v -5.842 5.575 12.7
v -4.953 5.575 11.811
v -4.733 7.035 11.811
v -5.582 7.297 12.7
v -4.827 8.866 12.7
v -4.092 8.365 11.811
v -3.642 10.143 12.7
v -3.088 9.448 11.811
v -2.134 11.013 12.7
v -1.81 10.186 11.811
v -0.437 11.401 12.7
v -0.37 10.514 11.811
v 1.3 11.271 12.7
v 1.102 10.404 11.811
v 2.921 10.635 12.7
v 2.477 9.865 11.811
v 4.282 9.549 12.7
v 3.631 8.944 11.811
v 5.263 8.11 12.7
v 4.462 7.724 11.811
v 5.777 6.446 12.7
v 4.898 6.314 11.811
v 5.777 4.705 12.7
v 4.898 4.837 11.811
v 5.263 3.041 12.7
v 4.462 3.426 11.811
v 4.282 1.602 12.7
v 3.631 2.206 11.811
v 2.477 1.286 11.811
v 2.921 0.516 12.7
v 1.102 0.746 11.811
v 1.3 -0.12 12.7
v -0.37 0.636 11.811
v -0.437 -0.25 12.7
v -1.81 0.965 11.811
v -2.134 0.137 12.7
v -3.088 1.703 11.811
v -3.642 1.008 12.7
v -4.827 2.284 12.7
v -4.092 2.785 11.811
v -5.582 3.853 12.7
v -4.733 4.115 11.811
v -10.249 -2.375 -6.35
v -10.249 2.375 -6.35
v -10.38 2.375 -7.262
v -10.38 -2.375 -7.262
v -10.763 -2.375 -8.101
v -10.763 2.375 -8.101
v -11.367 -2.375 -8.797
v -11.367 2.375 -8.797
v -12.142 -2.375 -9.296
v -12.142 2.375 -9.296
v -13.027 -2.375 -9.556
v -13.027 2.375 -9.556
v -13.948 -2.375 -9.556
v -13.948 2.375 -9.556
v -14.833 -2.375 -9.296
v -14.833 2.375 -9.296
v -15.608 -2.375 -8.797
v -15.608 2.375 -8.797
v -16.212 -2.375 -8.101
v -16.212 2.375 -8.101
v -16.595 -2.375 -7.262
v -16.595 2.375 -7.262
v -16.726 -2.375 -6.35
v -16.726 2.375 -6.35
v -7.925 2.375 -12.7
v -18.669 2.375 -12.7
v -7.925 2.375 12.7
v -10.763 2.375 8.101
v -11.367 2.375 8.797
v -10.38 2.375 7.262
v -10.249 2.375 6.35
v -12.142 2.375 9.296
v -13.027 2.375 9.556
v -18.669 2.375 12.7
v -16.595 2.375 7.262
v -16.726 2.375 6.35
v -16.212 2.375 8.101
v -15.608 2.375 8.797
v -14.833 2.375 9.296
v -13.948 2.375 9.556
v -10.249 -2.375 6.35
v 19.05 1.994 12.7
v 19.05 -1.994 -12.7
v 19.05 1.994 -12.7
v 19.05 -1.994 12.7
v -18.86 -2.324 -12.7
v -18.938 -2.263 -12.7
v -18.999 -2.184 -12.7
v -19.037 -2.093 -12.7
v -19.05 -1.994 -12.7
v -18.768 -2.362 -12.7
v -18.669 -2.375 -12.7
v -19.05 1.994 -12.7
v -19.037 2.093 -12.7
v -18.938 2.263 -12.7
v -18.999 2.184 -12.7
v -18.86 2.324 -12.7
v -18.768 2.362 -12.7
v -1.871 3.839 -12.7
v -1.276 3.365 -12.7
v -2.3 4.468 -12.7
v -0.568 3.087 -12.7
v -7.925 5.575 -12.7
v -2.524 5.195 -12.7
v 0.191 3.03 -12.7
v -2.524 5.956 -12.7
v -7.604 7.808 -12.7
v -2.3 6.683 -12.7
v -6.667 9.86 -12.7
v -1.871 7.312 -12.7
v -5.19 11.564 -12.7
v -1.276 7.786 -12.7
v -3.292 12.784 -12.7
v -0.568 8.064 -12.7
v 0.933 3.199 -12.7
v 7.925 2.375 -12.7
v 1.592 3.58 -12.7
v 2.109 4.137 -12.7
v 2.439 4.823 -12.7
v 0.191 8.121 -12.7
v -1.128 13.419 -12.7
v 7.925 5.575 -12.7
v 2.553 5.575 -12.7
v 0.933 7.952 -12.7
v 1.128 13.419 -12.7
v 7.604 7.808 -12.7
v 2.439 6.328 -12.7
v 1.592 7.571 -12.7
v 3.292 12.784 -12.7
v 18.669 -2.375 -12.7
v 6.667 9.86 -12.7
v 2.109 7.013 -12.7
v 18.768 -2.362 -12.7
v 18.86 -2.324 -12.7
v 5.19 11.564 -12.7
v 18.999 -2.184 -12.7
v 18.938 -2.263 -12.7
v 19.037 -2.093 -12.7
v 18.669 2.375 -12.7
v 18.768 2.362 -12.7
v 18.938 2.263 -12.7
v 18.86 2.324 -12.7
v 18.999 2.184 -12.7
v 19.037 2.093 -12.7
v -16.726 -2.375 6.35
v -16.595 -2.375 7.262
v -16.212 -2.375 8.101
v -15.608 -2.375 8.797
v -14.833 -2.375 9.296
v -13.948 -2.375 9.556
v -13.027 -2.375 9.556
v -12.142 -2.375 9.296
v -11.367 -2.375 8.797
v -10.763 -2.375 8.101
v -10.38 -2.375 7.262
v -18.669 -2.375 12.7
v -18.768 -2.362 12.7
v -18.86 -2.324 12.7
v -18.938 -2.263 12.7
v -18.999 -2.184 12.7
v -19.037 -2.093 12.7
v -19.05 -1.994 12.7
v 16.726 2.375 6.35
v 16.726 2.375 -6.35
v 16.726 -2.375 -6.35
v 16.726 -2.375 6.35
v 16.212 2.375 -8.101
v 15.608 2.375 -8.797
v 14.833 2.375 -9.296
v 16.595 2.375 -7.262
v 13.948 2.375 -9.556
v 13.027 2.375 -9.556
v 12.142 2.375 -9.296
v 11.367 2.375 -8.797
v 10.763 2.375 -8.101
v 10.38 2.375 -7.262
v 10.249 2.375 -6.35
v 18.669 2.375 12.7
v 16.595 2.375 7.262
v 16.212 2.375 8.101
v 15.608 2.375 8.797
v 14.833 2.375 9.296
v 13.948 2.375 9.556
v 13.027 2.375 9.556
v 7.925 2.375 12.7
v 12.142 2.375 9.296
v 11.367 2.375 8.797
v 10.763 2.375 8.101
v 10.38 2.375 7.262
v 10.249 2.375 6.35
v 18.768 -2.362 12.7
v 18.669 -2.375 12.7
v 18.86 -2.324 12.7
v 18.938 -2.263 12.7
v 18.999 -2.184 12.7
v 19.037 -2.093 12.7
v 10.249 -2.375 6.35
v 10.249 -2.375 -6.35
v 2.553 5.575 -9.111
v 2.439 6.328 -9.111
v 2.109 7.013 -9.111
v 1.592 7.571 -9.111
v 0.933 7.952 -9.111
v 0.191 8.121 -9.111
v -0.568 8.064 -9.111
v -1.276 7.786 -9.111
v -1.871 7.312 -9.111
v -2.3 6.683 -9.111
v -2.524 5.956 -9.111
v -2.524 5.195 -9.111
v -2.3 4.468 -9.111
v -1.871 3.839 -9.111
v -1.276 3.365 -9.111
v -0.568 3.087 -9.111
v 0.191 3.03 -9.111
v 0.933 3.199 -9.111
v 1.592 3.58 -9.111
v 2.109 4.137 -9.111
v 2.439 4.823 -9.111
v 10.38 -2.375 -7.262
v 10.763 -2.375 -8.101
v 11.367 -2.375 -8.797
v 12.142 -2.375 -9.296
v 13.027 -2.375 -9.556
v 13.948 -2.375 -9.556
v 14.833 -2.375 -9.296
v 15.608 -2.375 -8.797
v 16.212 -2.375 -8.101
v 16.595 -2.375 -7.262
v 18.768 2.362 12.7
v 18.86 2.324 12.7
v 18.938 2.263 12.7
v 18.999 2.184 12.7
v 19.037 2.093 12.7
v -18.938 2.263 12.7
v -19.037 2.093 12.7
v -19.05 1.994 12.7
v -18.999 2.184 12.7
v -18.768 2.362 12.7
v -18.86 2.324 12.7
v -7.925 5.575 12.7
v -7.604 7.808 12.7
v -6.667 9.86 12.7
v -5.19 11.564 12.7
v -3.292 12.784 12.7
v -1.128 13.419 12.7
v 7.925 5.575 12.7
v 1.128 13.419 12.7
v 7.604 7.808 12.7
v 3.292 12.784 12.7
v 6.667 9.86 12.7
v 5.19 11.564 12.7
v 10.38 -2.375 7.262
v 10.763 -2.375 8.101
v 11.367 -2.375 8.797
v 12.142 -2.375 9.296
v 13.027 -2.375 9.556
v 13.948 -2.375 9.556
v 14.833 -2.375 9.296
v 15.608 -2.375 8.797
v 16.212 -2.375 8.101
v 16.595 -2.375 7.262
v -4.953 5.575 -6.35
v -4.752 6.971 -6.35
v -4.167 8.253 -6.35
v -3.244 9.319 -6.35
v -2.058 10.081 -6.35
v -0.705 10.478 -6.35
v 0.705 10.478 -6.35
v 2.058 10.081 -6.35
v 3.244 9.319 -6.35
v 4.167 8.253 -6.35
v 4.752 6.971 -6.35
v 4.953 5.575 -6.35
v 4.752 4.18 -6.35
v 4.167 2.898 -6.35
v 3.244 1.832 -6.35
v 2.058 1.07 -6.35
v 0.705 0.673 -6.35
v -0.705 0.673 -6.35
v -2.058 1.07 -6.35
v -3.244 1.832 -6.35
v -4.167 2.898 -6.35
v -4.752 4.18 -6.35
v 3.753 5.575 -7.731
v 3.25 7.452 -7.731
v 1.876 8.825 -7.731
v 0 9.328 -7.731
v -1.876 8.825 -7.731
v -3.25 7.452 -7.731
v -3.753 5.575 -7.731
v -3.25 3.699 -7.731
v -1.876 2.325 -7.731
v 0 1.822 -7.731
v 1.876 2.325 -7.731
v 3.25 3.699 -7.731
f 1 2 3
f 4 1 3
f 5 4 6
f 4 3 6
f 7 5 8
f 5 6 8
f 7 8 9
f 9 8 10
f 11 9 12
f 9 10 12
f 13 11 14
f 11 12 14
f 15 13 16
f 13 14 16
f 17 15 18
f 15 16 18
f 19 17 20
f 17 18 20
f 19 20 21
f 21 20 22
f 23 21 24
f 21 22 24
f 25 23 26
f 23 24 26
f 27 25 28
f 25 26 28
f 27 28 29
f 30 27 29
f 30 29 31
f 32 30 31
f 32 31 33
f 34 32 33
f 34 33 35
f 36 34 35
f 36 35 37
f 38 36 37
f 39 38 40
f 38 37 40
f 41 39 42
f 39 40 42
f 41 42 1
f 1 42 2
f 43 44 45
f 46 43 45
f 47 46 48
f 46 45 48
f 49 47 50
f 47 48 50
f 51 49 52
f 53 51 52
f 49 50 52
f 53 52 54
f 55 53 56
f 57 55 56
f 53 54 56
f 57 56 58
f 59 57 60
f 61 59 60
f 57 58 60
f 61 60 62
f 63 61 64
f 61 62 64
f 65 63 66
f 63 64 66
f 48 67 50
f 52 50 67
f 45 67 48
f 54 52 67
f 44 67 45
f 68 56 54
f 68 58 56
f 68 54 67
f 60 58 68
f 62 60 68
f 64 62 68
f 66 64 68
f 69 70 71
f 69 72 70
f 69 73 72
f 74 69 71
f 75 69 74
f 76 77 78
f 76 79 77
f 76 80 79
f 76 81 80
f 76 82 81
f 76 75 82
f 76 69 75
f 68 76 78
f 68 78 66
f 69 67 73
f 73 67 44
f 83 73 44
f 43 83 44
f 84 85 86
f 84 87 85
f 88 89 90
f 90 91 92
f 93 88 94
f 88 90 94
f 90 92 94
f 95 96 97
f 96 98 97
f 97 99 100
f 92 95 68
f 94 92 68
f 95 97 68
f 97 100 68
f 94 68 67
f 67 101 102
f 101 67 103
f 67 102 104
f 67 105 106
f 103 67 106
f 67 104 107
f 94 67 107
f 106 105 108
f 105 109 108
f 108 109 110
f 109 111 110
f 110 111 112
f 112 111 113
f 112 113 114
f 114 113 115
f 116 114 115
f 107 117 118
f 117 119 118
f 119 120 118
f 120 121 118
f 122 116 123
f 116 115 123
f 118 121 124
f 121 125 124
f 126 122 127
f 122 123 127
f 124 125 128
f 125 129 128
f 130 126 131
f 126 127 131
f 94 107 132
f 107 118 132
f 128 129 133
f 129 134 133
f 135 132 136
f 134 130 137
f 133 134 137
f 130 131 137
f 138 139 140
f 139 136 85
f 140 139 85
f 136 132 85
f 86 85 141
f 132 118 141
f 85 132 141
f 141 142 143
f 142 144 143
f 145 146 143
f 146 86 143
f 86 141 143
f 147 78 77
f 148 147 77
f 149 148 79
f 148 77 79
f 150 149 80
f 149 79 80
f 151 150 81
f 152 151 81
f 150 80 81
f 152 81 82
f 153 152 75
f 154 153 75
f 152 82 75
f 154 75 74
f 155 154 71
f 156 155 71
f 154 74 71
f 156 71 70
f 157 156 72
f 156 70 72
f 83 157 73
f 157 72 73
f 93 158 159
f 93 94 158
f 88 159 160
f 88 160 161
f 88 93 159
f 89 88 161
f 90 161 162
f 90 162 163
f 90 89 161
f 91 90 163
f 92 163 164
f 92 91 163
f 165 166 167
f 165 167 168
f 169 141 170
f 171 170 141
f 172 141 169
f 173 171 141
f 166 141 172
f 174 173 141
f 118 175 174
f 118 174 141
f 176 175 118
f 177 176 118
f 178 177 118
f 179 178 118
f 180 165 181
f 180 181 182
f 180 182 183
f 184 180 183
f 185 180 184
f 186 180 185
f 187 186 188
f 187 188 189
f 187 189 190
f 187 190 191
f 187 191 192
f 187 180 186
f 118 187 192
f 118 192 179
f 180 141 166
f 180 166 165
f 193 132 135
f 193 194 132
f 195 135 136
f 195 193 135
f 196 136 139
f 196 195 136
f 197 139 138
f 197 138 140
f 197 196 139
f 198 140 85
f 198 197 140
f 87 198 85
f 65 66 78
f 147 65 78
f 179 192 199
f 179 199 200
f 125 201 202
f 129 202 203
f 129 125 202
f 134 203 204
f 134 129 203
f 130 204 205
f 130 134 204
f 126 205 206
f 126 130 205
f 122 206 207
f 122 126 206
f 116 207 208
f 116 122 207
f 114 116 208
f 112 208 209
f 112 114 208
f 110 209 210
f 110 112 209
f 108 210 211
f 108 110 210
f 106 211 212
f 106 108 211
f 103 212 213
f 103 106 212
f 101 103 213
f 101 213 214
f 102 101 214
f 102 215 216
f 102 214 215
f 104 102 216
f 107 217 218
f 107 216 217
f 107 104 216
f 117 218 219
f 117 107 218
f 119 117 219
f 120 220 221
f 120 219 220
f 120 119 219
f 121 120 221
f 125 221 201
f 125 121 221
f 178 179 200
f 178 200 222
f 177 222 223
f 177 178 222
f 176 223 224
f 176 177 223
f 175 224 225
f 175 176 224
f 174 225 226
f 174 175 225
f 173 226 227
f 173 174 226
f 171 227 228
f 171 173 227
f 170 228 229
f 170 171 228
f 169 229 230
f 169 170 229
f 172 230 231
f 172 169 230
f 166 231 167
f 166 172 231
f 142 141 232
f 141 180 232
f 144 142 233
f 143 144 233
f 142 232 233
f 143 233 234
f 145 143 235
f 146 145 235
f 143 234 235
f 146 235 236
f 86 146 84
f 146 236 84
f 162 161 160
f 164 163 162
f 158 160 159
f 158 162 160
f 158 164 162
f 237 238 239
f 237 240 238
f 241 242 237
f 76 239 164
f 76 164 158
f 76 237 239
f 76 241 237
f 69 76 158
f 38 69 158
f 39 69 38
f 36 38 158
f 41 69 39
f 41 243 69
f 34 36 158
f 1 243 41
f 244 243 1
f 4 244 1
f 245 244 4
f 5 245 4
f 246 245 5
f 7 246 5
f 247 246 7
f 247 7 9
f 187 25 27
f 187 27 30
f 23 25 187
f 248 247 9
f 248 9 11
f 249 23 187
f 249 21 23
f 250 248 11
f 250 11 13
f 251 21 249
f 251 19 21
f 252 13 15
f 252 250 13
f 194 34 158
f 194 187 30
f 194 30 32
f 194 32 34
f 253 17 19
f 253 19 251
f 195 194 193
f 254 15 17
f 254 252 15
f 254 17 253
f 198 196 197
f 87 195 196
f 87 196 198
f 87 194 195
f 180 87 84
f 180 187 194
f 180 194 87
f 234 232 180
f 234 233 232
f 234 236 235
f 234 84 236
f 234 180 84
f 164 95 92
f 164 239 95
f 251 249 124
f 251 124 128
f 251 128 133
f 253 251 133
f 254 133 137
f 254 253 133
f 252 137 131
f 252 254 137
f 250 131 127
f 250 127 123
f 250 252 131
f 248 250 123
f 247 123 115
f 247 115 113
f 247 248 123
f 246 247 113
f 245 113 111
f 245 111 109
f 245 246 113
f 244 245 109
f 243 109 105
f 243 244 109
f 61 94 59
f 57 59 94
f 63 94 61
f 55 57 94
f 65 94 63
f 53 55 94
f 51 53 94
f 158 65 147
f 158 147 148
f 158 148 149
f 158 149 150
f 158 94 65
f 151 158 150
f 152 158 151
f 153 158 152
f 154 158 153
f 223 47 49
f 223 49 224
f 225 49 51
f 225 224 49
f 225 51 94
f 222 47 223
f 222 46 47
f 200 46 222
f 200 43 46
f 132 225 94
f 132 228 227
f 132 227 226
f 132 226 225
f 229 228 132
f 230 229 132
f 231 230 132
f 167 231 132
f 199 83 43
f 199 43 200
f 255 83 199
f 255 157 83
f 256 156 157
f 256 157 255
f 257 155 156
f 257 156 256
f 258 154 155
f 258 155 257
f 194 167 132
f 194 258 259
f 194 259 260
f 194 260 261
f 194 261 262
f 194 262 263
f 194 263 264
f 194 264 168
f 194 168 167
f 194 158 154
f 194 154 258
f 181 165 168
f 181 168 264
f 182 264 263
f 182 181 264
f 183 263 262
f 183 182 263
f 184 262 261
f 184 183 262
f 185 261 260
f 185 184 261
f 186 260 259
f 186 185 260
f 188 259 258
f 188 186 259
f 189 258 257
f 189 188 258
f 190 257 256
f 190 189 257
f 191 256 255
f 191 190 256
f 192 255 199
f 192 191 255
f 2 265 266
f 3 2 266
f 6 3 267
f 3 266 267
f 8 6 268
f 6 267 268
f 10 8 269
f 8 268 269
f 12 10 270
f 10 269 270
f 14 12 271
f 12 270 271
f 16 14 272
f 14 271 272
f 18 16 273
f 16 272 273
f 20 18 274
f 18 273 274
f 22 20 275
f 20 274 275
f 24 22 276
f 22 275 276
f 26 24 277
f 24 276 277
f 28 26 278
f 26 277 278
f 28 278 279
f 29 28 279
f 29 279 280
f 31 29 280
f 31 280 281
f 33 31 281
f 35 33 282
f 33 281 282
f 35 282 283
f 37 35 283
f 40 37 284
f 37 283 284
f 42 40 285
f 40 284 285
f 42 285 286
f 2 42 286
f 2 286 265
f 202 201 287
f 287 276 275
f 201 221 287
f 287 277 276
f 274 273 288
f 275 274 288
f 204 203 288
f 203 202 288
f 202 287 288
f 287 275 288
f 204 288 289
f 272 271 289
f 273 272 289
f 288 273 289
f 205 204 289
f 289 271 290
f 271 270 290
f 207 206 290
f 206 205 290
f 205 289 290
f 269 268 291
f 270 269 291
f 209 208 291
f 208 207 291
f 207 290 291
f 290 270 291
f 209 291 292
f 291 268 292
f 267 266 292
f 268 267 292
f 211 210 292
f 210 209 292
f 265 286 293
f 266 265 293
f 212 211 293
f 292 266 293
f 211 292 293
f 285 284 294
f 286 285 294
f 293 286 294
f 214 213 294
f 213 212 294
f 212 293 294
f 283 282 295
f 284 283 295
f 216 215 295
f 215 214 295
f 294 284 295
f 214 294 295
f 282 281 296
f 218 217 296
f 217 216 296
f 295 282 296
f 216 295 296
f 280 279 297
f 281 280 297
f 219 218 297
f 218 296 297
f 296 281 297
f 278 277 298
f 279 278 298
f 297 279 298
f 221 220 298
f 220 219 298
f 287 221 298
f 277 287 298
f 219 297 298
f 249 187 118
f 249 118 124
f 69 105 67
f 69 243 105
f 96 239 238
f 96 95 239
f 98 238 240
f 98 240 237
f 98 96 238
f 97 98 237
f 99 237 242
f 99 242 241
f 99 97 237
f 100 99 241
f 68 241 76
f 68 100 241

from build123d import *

# Parameters (mm, degrees)
SKETCH1_R                      = 2.5527
BOSS_EXTRUDE1_DEPTH            = 12.7
FILLET1_R                      = 0.381
F_1_2_0_5_DIAMETER_HOLE2_D     = 9.906
F_1_2_0_5_DIAMETER_HOLE2_DEPTH = 19.05
F_1_2_0_5_DIAMETER_HOLE2_TIP   = 5.697774721
CHAMFER2_SIZE                  = 0.889
CUT_EXTRUDE1_DEPTH             = 9.906


with BuildPart() as part:
    # Sketch1 → Boss-Extrude1 (new, symmetric)
    with BuildSketch(Plane.XY):
        with BuildLine():
            Line((-19.05, -2.3749), (19.05, -2.3749))
            Line((19.05, -2.3749), (19.05, 2.3749))
            Line((19.05, 2.3749), (7.9248, 2.3749))
            Line((7.9248, 2.3749), (7.9248, 5.5753))
            ThreePointArc((7.9248, 5.5753), (0, 13.5001), (-7.9248, 5.5753))
            Line((-7.9248, 5.5753), (-7.9248, 2.3749))
            Line((-7.9248, 2.3749), (-19.05, 2.3749))
            Line((-19.05, 2.3749), (-19.05, -2.3749))
        make_face()
        with Locations((0, 5.5753)):
            Circle(SKETCH1_R, mode=Mode.SUBTRACT)
    extrude(amount=BOSS_EXTRUDE1_DEPTH, both=True)

    # Fillet1
    fillet1_edges = [part.edges().sort_by_distance(p)[0] for p in [
        (19.05, 2.3749, 0),
        (19.05, -2.3749, 0),
        (-19.05, -2.3749, 0),
        (-19.05, 2.3749, 0),
    ]]
    fillet(fillet1_edges, radius=FILLET1_R)

    # 1/2 (0.5) Diameter Hole2
    with Locations(Plane.XY.offset(12.7)):
        with Locations((0, 5.5753)):
            Hole(F_1_2_0_5_DIAMETER_HOLE2_D / 2, depth=F_1_2_0_5_DIAMETER_HOLE2_DEPTH)
            with Locations((0, 0, -(F_1_2_0_5_DIAMETER_HOLE2_DEPTH + F_1_2_0_5_DIAMETER_HOLE2_TIP / 2))):  # 82° drill point
                Cone(0, F_1_2_0_5_DIAMETER_HOLE2_D / 2, F_1_2_0_5_DIAMETER_HOLE2_TIP, mode=Mode.SUBTRACT)

    # Chamfer2
    chamfer2_edges = [part.edges().sort_by_distance(p)[0] for p in [
        (4.953, 5.5753, 12.7),
    ]]
    chamfer(chamfer2_edges, length=CHAMFER2_SIZE)

    # Sketch9 → Cut-Extrude1 (cut)
    with BuildSketch(Plane(origin=(0, 2.3749, 0), x_dir=(1, 0, 0), z_dir=(0, 1, 0))):
        with BuildLine():
            Line((16.7259, 6.35), (16.7259, -6.35))
            ThreePointArc((16.7259, -6.35), (13.4874, -9.5885), (10.2489, -6.35))
            Line((10.2489, -6.35), (10.2489, 6.35))
            ThreePointArc((10.2489, 6.35), (13.4874, 9.5885), (16.7259, 6.35))
        make_face()
        with BuildLine():
            Line((-16.7259, 6.35), (-16.7259, -6.35))
            ThreePointArc((-16.7259, -6.35), (-13.4874, -9.5885), (-10.2489, -6.35))
            Line((-10.2489, -6.35), (-10.2489, 6.35))
            ThreePointArc((-10.2489, 6.35), (-13.4874, 9.5885), (-16.7259, 6.35))
        make_face()
    extrude(amount=-CUT_EXTRUDE1_DEPTH, mode=Mode.SUBTRACT)


solid = part.part
